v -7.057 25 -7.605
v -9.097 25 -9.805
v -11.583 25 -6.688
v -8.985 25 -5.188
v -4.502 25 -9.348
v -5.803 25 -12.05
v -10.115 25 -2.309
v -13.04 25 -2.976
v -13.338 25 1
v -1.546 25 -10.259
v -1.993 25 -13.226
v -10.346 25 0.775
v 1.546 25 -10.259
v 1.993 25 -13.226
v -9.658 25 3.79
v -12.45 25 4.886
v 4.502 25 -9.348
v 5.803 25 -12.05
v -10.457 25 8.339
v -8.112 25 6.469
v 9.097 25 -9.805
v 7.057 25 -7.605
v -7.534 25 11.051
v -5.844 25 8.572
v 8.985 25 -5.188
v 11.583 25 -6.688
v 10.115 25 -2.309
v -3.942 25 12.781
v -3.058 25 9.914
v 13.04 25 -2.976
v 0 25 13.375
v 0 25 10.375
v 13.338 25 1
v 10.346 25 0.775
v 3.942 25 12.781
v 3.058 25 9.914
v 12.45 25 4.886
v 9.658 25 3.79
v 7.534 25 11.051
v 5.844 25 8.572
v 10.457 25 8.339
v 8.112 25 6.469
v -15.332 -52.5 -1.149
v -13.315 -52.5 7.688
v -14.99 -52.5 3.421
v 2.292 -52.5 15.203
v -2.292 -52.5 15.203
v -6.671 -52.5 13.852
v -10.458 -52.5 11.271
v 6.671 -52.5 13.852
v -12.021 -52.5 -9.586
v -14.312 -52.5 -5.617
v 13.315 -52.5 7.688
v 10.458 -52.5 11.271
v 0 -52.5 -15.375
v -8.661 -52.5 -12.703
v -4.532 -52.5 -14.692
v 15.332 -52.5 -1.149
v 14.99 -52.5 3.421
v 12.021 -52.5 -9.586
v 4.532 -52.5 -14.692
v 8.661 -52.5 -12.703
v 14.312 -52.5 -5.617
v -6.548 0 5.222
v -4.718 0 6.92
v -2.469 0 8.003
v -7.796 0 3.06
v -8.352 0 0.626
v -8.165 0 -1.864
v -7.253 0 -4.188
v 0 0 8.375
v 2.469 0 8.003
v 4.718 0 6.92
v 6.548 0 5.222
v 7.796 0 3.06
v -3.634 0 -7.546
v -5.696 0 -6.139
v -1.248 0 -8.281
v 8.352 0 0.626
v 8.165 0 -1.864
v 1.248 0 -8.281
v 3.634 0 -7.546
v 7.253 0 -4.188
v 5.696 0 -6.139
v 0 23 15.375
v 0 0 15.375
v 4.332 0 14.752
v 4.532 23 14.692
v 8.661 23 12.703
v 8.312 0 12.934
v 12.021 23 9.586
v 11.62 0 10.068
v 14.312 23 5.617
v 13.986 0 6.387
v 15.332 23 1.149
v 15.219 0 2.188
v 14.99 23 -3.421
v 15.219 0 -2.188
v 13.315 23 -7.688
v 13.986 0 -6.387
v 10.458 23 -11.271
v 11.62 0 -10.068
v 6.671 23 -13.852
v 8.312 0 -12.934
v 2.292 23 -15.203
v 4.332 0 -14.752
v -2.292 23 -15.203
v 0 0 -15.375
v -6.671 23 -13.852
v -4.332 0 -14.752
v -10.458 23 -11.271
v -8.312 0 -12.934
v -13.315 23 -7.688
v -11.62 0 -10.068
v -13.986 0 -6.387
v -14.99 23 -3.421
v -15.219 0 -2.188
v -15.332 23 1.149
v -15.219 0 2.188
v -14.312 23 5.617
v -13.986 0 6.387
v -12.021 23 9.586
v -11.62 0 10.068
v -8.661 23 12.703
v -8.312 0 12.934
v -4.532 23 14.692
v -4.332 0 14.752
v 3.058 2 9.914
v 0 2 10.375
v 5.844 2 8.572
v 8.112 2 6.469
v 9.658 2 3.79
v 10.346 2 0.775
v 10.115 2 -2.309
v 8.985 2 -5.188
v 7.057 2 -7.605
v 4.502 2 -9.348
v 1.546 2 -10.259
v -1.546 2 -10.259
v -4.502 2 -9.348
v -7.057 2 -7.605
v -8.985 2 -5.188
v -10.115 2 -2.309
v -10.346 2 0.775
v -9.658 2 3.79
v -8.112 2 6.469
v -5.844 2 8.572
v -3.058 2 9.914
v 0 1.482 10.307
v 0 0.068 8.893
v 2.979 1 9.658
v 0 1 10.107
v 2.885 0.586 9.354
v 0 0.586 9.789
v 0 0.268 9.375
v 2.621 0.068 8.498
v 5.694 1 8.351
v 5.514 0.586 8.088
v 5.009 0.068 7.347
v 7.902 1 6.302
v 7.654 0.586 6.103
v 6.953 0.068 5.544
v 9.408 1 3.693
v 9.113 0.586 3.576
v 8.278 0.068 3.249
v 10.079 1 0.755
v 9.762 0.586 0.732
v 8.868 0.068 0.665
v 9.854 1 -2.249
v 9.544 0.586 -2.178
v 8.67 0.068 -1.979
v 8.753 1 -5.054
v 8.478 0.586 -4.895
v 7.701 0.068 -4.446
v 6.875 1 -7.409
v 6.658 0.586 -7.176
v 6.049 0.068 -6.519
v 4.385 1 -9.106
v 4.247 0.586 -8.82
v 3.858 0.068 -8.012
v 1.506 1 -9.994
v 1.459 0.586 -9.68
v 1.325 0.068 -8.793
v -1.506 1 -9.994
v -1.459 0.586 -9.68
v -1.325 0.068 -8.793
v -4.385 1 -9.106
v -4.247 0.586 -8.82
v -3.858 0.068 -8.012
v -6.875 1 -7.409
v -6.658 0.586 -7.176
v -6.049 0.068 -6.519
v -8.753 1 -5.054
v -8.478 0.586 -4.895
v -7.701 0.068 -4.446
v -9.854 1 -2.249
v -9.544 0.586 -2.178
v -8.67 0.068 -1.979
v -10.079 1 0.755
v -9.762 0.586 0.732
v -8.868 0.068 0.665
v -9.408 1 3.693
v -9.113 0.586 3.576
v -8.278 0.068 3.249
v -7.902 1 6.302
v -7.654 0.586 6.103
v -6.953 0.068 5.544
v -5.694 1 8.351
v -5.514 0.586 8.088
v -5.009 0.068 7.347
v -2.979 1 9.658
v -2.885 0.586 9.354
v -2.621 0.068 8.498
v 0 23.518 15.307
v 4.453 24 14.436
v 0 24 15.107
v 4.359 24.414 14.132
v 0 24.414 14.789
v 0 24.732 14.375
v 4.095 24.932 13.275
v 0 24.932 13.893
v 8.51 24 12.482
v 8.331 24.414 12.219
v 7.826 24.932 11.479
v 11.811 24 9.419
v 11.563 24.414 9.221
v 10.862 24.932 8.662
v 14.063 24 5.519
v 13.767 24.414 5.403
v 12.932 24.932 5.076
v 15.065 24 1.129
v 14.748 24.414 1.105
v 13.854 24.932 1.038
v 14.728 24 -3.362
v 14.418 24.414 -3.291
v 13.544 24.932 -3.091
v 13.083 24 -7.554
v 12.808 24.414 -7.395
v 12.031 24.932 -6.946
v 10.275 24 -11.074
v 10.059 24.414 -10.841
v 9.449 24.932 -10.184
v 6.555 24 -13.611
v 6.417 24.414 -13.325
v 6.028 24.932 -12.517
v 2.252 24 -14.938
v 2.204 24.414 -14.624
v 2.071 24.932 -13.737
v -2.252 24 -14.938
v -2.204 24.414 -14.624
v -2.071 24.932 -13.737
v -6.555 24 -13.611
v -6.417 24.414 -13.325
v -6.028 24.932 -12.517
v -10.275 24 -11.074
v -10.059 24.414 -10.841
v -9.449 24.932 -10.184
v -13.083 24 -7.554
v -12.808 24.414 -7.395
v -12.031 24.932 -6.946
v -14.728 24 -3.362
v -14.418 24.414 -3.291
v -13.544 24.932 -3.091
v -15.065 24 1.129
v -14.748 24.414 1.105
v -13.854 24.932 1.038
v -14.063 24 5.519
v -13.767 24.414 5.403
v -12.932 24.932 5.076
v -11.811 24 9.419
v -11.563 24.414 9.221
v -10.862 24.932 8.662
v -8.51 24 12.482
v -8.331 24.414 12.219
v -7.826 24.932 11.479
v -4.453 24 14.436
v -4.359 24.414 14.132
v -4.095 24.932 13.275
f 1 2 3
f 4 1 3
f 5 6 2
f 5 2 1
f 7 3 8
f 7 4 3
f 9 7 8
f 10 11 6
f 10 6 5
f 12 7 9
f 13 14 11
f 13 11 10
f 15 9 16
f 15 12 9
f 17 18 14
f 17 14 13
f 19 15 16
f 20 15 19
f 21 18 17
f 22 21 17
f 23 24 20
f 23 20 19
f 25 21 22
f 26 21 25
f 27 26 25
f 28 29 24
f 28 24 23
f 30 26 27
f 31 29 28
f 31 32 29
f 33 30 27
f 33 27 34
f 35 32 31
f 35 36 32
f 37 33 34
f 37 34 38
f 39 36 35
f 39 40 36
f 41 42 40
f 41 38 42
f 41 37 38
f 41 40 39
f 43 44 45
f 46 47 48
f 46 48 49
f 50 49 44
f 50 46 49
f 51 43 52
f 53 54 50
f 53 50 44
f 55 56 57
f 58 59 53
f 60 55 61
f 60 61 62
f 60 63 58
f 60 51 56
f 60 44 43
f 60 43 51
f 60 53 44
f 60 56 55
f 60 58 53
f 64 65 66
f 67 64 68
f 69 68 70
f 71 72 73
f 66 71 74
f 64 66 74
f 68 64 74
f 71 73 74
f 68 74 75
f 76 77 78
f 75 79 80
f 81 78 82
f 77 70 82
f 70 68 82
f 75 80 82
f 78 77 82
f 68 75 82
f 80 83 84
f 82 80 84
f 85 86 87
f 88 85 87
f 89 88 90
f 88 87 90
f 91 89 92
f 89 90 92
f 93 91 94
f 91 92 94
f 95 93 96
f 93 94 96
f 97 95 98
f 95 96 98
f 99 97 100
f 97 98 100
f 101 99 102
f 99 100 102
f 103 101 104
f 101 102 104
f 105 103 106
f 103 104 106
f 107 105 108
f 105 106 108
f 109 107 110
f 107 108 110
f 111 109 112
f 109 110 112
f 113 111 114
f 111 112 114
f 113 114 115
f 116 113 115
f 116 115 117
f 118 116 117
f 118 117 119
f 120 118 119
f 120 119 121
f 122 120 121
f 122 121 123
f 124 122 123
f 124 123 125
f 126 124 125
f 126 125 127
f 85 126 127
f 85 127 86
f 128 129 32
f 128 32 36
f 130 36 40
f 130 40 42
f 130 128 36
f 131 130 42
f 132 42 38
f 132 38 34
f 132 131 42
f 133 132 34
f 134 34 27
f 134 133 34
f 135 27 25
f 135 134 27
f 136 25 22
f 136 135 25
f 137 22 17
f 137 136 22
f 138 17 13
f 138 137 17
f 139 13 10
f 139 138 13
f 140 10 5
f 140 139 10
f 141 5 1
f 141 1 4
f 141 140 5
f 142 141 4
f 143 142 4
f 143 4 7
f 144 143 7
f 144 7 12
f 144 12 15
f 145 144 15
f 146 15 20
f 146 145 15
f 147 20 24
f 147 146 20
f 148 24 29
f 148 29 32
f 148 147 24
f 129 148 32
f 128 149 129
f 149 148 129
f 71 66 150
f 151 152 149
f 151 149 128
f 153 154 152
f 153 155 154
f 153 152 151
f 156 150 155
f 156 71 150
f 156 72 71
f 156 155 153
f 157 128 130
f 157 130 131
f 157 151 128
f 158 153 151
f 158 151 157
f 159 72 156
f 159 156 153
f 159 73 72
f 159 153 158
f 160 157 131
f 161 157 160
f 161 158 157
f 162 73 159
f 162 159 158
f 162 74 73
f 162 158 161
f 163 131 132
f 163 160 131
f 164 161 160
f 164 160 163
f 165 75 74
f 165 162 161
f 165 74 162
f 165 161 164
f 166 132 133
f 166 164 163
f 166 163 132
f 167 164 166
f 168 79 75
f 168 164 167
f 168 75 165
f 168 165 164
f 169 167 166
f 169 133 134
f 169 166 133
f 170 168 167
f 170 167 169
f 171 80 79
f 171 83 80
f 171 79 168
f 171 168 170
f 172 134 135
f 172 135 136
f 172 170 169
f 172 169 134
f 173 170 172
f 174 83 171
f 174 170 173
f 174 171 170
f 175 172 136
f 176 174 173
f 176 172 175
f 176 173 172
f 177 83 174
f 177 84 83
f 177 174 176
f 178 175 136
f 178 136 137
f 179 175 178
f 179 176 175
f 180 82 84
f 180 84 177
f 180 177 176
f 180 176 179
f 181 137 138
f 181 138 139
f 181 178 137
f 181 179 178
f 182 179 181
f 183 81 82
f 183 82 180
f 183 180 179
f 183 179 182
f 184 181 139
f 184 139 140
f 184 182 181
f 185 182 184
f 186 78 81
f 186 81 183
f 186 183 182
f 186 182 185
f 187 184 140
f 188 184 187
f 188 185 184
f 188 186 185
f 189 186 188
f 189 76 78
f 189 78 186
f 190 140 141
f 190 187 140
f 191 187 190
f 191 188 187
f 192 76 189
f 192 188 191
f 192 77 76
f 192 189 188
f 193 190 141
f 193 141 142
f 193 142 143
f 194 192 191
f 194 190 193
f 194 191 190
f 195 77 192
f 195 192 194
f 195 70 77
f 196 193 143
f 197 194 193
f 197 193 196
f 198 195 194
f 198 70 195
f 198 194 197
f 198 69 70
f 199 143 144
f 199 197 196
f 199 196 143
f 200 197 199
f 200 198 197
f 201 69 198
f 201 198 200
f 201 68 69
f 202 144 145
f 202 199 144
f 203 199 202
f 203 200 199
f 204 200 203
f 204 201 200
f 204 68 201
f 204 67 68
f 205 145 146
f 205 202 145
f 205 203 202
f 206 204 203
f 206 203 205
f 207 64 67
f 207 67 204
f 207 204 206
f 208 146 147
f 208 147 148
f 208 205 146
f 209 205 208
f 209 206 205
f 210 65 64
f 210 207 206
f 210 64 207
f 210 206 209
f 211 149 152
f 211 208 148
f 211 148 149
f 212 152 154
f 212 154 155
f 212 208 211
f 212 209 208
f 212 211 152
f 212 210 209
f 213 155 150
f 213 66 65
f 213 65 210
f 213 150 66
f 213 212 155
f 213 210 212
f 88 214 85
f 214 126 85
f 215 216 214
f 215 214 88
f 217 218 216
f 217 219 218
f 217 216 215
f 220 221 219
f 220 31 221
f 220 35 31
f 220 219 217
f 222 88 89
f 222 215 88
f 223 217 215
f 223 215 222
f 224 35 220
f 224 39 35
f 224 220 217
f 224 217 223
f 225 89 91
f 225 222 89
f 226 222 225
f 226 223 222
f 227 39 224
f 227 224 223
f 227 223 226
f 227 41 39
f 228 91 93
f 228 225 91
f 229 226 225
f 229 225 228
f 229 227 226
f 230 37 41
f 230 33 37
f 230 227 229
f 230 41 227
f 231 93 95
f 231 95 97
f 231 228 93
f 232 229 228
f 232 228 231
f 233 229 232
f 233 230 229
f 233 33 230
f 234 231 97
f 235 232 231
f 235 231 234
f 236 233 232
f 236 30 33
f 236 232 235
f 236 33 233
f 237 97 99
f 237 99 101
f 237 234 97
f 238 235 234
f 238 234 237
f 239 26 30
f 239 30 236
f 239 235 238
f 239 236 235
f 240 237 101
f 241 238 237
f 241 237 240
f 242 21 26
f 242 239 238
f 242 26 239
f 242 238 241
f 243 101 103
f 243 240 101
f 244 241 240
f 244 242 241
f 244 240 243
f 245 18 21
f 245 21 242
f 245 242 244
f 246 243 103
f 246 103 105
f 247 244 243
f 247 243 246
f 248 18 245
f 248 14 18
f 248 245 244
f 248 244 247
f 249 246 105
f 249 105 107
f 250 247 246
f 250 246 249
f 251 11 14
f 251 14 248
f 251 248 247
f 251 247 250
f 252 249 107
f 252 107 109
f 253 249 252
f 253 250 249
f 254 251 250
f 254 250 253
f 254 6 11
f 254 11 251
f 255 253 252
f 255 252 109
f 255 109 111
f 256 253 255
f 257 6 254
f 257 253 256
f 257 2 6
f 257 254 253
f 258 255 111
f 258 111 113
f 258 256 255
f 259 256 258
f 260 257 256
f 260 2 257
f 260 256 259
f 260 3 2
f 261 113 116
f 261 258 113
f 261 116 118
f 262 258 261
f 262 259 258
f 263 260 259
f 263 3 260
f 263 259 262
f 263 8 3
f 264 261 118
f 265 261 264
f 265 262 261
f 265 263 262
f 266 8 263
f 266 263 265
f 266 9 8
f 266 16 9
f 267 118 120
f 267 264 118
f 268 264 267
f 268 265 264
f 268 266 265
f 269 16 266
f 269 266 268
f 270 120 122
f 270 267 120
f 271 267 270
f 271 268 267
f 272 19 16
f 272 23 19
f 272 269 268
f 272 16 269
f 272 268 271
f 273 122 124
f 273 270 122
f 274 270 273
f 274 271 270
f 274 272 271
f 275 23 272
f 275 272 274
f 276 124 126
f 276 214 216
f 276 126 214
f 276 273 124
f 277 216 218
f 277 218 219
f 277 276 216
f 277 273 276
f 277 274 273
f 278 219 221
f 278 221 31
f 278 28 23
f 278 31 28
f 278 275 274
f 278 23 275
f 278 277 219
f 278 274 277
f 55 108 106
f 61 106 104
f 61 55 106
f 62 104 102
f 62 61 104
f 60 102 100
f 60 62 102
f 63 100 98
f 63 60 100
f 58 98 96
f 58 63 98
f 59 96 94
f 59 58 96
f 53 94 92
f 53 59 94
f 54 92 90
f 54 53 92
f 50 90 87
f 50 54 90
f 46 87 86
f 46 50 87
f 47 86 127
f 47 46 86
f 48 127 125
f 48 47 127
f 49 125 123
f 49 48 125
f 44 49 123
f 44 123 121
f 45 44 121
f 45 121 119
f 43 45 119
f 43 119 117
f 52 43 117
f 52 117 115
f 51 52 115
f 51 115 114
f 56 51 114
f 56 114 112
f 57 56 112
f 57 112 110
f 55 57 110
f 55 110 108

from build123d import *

# Parameters (mm, degrees)
SKETCH1_R           = 15.375
SKETCH1_R_2         = 10.375
BOSS_EXTRUDE1_DEPTH = 25
BOSS_EXTRUDE2_START = 52.5
SKETCH3_R           = 15.375
BOSS_EXTRUDE2_DEPTH = 52.5
FILLET1_R           = 2


with BuildPart() as part:
    # Sketch1 → Boss-Extrude1 (new body)
    with BuildSketch(Plane(origin=(0, 0, 0), x_dir=(1, 0, 0), z_dir=(0, 1, 0))):
        with Locations(Location((0, 0, 0), (0, 0, 270))):
            Circle(SKETCH1_R)
        with Locations(Location((0, 0, 0), (0, 0, 270))):
            Circle(SKETCH1_R_2, mode=Mode.SUBTRACT)
    extrude(amount=BOSS_EXTRUDE1_DEPTH)

    # Sketch3 → Boss-Extrude2 (add)
    with BuildSketch(Plane.XZ.offset(BOSS_EXTRUDE2_START)):
        with Locations(Location((0, 0, 0), (0, 0, 270))):
            Circle(SKETCH3_R)
    extrude(amount=-BOSS_EXTRUDE2_DEPTH)

    # Fillet1
    fillet1_edges = [part.edges().sort_by_distance(p)[0] for p in [
        (0, 25, -15.375),
        (0, 0, -10.375),
    ]]
    fillet(fillet1_edges, radius=FILLET1_R)


solid = part.part
